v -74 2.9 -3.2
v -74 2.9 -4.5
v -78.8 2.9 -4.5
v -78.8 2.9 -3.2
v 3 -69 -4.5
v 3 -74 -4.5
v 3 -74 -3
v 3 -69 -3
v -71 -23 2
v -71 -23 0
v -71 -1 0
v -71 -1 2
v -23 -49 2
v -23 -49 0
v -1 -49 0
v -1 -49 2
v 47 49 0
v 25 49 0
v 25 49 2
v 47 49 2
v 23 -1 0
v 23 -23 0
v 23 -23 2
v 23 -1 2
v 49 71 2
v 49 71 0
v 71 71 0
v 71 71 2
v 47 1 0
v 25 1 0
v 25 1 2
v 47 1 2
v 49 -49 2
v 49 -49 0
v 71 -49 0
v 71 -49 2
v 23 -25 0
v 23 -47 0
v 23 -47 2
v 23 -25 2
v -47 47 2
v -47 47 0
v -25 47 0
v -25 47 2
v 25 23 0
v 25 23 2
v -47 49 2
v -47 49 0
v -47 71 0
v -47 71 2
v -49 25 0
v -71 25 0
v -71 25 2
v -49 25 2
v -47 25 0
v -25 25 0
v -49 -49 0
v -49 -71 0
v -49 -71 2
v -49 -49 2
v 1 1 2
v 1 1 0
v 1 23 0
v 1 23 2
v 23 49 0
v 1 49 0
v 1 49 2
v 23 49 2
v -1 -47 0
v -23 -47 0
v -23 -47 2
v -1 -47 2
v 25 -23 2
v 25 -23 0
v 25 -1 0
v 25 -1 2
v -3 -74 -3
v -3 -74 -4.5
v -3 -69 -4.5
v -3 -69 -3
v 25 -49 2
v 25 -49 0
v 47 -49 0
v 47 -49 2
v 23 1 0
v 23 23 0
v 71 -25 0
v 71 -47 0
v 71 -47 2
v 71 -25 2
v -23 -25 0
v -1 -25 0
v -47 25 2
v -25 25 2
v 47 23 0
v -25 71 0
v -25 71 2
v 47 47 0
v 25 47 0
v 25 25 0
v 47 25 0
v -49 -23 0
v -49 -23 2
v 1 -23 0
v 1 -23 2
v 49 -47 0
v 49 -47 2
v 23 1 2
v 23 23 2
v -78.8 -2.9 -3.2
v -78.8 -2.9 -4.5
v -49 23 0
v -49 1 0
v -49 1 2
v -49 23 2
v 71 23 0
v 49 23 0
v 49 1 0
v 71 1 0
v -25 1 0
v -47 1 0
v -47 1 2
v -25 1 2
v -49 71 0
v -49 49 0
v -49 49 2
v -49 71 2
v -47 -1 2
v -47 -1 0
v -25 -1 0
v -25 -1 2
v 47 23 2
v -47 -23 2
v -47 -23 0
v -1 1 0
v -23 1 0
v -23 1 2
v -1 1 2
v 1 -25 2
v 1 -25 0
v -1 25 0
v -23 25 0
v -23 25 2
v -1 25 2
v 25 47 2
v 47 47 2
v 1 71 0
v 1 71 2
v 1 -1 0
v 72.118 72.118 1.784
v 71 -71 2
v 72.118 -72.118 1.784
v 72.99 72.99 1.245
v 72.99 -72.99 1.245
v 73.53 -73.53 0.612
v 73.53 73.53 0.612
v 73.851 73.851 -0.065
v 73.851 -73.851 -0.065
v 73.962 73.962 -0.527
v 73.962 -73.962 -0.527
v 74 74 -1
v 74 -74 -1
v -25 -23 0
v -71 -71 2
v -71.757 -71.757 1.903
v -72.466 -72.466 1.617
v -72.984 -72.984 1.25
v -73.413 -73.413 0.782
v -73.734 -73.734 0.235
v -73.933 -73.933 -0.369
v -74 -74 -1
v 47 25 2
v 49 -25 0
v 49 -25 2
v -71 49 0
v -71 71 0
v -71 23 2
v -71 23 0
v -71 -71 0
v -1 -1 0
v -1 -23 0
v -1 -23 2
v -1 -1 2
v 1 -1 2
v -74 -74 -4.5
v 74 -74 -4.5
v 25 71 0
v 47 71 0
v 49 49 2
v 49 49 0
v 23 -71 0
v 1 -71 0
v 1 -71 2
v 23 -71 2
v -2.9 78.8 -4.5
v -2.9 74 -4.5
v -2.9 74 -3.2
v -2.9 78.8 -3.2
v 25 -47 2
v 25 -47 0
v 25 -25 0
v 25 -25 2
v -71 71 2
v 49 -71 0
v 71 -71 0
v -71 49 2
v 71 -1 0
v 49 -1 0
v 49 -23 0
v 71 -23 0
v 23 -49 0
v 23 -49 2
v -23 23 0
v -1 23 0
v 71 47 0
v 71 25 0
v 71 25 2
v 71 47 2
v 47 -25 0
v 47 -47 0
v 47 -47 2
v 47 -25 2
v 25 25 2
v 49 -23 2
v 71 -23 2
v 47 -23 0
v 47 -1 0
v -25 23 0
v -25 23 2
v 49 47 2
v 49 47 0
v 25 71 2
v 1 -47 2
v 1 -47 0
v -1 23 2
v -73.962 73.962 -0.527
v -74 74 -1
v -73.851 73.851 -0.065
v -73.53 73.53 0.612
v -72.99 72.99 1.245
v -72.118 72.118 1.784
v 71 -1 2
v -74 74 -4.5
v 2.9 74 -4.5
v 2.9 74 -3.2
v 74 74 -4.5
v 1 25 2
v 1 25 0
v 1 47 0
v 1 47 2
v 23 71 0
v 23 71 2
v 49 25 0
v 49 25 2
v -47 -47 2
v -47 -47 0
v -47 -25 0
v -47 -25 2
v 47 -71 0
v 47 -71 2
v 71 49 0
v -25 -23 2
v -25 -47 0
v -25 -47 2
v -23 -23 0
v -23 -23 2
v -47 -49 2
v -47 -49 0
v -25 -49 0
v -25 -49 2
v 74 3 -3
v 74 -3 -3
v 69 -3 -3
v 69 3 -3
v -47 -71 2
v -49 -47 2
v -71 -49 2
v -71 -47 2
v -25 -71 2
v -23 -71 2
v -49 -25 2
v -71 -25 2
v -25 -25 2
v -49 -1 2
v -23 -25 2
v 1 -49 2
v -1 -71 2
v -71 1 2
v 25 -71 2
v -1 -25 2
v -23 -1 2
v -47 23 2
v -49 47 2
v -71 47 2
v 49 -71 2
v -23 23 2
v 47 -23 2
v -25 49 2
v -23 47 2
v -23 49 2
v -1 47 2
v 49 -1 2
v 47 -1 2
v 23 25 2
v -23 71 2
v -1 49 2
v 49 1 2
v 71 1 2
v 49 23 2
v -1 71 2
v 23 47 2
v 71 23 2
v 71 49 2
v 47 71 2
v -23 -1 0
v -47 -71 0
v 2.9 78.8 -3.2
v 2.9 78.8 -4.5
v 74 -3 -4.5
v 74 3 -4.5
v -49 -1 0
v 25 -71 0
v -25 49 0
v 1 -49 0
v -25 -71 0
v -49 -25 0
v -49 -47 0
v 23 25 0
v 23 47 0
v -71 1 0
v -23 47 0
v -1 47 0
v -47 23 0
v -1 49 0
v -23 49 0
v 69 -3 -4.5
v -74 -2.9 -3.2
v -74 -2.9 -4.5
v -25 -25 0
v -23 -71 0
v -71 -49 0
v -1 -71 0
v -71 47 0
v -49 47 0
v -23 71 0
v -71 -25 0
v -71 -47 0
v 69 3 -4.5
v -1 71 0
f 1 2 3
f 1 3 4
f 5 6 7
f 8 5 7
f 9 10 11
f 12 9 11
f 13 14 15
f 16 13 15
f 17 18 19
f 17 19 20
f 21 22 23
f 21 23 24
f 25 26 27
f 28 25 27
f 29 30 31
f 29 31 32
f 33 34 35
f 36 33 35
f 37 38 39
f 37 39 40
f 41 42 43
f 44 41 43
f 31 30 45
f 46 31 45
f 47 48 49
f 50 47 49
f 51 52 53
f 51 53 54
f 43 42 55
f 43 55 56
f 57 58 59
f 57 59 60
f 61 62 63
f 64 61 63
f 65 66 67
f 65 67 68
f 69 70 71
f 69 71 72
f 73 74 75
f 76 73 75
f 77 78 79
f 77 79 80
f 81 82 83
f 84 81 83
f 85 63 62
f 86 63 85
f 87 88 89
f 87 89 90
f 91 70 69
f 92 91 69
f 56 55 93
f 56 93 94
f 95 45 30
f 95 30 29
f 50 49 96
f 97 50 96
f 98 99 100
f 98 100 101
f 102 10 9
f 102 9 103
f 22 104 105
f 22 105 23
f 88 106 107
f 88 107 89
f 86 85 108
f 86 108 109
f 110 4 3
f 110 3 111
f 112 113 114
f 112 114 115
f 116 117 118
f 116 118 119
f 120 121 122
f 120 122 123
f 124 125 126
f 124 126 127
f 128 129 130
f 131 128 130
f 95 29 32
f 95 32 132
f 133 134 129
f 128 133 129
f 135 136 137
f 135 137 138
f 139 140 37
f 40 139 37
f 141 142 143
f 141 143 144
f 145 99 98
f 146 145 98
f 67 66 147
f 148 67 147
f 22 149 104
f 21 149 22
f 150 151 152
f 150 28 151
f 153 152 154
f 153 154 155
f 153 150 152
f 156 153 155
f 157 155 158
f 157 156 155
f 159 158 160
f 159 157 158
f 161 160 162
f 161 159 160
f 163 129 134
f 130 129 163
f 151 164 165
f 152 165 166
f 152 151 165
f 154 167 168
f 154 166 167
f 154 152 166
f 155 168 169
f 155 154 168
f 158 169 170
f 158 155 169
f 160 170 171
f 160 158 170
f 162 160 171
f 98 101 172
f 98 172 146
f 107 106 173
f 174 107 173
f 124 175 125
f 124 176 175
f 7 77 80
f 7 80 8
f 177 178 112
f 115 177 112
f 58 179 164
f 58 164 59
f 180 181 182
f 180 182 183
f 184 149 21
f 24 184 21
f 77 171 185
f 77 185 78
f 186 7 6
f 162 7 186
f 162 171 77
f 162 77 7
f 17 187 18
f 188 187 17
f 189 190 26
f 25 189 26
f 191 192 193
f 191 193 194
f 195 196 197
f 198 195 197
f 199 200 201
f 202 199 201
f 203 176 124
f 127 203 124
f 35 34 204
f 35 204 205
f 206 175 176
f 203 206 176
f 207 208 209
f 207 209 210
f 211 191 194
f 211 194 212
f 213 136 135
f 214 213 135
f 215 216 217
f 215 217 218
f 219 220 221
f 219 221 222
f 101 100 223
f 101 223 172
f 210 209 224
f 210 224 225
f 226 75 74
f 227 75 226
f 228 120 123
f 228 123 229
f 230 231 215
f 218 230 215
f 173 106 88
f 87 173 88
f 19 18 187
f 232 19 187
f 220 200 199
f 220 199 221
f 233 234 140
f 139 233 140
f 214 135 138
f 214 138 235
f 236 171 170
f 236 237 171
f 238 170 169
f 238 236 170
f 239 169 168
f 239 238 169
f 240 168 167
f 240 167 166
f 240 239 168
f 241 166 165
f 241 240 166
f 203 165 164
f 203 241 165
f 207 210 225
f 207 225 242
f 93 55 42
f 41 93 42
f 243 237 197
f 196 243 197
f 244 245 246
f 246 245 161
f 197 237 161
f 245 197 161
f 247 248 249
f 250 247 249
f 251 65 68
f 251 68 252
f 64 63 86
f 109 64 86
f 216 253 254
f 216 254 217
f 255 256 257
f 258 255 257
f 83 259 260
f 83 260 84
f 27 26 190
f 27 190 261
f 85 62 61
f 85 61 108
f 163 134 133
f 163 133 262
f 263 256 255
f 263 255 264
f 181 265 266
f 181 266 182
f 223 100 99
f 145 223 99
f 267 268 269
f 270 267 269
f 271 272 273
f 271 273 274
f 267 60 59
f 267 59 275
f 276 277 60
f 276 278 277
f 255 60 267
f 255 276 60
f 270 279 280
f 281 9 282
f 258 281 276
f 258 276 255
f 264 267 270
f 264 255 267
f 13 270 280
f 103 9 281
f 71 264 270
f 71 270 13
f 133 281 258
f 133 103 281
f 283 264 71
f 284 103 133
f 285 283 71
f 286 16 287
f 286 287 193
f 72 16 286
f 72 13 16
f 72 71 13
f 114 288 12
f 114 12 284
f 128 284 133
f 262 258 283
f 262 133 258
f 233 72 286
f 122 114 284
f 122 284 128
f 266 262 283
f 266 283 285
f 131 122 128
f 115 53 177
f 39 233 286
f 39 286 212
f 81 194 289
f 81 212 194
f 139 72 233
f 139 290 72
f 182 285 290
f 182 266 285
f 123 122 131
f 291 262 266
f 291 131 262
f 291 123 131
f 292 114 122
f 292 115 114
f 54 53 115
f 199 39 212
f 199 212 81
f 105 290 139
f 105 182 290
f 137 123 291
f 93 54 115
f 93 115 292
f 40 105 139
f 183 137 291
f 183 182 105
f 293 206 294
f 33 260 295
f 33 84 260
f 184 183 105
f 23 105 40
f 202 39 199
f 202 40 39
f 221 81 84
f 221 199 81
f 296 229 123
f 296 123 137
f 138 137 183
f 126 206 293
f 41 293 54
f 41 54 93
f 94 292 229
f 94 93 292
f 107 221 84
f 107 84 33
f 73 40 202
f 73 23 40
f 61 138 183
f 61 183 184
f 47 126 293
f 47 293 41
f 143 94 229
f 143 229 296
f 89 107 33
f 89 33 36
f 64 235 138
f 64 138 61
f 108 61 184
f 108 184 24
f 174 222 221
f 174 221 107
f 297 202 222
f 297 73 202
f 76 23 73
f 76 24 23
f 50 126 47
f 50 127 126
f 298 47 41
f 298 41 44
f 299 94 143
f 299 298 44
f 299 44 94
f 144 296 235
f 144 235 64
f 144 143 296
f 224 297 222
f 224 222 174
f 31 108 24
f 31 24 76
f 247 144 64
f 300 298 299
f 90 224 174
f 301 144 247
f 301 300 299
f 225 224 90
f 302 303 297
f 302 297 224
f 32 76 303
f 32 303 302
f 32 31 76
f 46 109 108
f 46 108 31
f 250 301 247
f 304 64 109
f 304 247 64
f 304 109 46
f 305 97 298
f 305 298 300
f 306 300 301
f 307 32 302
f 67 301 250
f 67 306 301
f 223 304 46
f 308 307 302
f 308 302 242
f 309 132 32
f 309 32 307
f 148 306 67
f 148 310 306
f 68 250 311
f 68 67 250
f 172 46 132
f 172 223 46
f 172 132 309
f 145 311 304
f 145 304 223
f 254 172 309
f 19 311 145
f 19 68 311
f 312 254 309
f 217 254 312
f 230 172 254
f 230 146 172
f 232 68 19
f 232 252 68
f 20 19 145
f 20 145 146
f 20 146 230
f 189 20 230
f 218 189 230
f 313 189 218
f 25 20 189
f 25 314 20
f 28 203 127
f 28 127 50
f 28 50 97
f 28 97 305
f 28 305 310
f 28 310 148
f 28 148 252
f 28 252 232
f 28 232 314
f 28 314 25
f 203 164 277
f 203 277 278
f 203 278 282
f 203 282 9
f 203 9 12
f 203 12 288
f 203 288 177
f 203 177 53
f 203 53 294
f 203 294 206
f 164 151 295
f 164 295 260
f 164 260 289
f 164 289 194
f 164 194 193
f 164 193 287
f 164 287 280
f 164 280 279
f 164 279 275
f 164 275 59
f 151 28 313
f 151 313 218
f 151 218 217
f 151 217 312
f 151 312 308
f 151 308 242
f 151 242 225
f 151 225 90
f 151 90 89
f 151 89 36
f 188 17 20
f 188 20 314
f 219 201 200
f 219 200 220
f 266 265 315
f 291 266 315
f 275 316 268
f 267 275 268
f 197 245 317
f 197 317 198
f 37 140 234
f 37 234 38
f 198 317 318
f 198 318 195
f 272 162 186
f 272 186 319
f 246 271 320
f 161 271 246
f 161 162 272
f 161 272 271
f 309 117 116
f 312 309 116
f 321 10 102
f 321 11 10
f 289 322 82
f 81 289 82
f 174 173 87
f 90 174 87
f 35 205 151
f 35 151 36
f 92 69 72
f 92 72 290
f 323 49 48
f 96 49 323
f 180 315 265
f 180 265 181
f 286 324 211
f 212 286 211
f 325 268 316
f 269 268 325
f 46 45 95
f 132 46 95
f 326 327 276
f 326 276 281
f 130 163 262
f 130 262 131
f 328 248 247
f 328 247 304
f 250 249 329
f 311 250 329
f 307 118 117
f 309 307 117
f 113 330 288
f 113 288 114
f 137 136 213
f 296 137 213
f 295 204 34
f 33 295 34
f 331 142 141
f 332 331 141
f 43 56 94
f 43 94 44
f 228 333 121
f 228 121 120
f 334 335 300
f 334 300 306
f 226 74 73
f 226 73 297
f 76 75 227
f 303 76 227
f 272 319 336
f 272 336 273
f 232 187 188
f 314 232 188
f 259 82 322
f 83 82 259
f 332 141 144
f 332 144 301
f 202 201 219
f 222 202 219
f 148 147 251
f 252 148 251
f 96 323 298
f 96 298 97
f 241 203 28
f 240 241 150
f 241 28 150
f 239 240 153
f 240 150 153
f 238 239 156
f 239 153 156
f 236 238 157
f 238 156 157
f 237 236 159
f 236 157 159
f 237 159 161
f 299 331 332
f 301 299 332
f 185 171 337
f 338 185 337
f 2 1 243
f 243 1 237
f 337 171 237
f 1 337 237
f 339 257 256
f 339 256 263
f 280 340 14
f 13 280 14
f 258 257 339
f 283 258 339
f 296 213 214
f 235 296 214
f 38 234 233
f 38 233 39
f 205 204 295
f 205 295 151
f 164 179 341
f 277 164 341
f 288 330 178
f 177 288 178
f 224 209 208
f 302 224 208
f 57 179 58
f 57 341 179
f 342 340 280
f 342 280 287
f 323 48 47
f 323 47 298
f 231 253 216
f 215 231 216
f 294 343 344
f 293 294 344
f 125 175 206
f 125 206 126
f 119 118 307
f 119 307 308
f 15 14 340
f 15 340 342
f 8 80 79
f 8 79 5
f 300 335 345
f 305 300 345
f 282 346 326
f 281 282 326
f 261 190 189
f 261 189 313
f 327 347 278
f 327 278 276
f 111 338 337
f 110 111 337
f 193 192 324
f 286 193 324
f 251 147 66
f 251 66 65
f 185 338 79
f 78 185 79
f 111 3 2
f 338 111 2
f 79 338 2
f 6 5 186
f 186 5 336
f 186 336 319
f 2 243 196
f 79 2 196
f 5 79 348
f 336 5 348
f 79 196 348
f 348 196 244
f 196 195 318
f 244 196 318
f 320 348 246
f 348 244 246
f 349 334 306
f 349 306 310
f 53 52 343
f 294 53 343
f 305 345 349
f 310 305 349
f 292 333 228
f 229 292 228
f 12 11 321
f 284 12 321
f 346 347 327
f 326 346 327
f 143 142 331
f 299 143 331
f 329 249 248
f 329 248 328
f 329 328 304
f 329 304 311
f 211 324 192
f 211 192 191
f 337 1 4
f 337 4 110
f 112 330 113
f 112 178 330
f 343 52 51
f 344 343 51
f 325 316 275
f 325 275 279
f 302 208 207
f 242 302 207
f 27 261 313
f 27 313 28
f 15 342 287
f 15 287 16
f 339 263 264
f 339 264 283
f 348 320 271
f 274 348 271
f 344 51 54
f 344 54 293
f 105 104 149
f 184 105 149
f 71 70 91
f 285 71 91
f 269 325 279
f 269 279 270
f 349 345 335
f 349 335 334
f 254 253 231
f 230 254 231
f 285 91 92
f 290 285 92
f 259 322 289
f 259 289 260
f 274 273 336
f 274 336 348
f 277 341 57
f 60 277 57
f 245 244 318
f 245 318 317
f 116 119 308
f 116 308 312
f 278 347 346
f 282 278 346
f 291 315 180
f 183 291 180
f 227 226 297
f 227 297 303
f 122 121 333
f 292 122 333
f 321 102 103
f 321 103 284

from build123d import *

# Parameters (mm, degrees)
F1_W      = 2
F1_H      = 142
F3_DEPTH  = 2
F0_W      = 148
F0_H      = 148
F0_W_2    = 142
F0_H_2    = 142
F2_W      = 142
F2_H      = 2
F5_DEPTH  = 2
F6_DEPTH  = 2
F4_W      = 148
F4_H      = 148
F7_DEPTH  = 4.5
F8_R      = 2.99999
F9_W      = 6
F9_H      = 1.5
F10_DEPTH = 5
F11_W     = 6
F11_H     = 1.5
F12_DEPTH = 5
F13_W     = 5.8
F13_H     = 1.3
F14_DEPTH = 4.8
F15_W     = 5.8
F15_H     = 1.3
F16_DEPTH = 4.8


# Not quite as in the source:
# - a fillet or chamfer is up to 0.001 mm smaller than in the source, because OpenCascade refuses the exact size


with BuildPart() as f3:
    # F1 (on Top) → F3 (new body)
    with BuildSketch(Plane.XY):
        with Locations((-48, 0)):
            Rectangle(F1_W, F1_H)
    extrude(amount=F3_DEPTH)



with BuildPart() as f3b:
    # F0 (on Top) → F3, piece 2 (new body)
    with BuildSketch(Plane.XY):
        Rectangle(F0_W, F0_H)
        Rectangle(F0_W_2, F0_H_2, mode=Mode.SUBTRACT)
    extrude(amount=F3_DEPTH)


with BuildPart() as f5:
    # F2 (on Top) → F5 (new body)
    with BuildSketch(Plane.XY):
        with Locations((0, 48)):
            Rectangle(F2_W, F2_H)
    extrude(amount=F5_DEPTH)


with BuildPart() as f5b:
    # F2 (on Top) → F5, piece 2 (new body)
    with BuildSketch(Plane.XY):
        with Locations((0, 24)):
            Rectangle(F2_W, F2_H)
    extrude(amount=F5_DEPTH)


with BuildPart() as f5c:
    # F2 (on Top) → F5, piece 3 (new body)
    with BuildSketch(Plane.XY):
        Rectangle(F2_W, F2_H)
    extrude(amount=F5_DEPTH)


with BuildPart() as f5d:
    # F2 (on Top) → F5, piece 4 (new body)
    with BuildSketch(Plane.XY):
        with Locations((0, -24)):
            Rectangle(F2_W, F2_H)
    extrude(amount=F5_DEPTH)


with BuildPart() as f5e:
    # F2 (on Top) → F5, piece 5 (new body)
    with BuildSketch(Plane.XY):
        with Locations((0, -48)):
            Rectangle(F2_W, F2_H)
    extrude(amount=F5_DEPTH)


with BuildPart() as f3_1:
    add(f3.part)

    add(f3b.part)  # F6 merges F3b

    add(f5.part)  # F6 merges F5

    add(f5b.part)  # F6 merges F5b

    add(f5c.part)  # F6 merges F5c

    add(f5d.part)  # F6 merges F5d

    add(f5e.part)  # F6 merges F5e
    # F1 (on Top) → F6 (join)
    with BuildSketch(Plane.XY):
        with Locations((-48, 0)):
            Rectangle(F1_W, F1_H)
        with Locations((-24, 0)):
            Rectangle(F1_W, F1_H)
        Rectangle(F1_W, F1_H)
        with Locations((24, 0)):
            Rectangle(F1_W, F1_H)
        with Locations((48, 0)):
            Rectangle(F1_W, F1_H)
    extrude(amount=F6_DEPTH)

    # F4 (on Top) → F7 (join)
    with BuildSketch(Plane.XY):
        Rectangle(F4_W, F4_H)
    extrude(amount=-F7_DEPTH)

    # F8 (radius 3 in the source; OpenCascade refuses exactly that, so slightly less here)
    f8_edges = [f3_1.edges().sort_by_distance(p)[0] for p in [
        (0, 74, 2),
        (-74, 0, 2),
        (0, -74, 2),
        (74, 0, 2),
    ]]
    fillet(f8_edges, radius=F8_R)

    # F9 (on face) → F10 (cut)
    with BuildSketch(Plane.YZ.offset(74)):
        with Locations((0, -3.75)):
            Rectangle(F9_W, F9_H)
    extrude(amount=-F10_DEPTH, mode=Mode.SUBTRACT)

    # F11 (on face) → F12 (cut)
    with BuildSketch(Plane.XZ.offset(74)):
        with Locations((0, -3.75)):
            Rectangle(F11_W, F11_H)
    extrude(amount=-F12_DEPTH, mode=Mode.SUBTRACT)

    # F13 (on face) → F14 (join)
    with BuildSketch(Plane(origin=(-74, 0, 0), x_dir=(0, -1, 0), z_dir=(-1, 0, 0))):
        with Locations((0, -3.85)):
            Rectangle(F13_W, F13_H)
    extrude(amount=F14_DEPTH)

    # F15 (on face) → F16 (join)
    with BuildSketch(Plane(origin=(0, 74, 0), x_dir=(-1, 0, 0), z_dir=(0, 1, 0))):
        with Locations((0, -3.85)):
            Rectangle(F15_W, F15_H)
    extrude(amount=F16_DEPTH)


solid = f3_1.part
